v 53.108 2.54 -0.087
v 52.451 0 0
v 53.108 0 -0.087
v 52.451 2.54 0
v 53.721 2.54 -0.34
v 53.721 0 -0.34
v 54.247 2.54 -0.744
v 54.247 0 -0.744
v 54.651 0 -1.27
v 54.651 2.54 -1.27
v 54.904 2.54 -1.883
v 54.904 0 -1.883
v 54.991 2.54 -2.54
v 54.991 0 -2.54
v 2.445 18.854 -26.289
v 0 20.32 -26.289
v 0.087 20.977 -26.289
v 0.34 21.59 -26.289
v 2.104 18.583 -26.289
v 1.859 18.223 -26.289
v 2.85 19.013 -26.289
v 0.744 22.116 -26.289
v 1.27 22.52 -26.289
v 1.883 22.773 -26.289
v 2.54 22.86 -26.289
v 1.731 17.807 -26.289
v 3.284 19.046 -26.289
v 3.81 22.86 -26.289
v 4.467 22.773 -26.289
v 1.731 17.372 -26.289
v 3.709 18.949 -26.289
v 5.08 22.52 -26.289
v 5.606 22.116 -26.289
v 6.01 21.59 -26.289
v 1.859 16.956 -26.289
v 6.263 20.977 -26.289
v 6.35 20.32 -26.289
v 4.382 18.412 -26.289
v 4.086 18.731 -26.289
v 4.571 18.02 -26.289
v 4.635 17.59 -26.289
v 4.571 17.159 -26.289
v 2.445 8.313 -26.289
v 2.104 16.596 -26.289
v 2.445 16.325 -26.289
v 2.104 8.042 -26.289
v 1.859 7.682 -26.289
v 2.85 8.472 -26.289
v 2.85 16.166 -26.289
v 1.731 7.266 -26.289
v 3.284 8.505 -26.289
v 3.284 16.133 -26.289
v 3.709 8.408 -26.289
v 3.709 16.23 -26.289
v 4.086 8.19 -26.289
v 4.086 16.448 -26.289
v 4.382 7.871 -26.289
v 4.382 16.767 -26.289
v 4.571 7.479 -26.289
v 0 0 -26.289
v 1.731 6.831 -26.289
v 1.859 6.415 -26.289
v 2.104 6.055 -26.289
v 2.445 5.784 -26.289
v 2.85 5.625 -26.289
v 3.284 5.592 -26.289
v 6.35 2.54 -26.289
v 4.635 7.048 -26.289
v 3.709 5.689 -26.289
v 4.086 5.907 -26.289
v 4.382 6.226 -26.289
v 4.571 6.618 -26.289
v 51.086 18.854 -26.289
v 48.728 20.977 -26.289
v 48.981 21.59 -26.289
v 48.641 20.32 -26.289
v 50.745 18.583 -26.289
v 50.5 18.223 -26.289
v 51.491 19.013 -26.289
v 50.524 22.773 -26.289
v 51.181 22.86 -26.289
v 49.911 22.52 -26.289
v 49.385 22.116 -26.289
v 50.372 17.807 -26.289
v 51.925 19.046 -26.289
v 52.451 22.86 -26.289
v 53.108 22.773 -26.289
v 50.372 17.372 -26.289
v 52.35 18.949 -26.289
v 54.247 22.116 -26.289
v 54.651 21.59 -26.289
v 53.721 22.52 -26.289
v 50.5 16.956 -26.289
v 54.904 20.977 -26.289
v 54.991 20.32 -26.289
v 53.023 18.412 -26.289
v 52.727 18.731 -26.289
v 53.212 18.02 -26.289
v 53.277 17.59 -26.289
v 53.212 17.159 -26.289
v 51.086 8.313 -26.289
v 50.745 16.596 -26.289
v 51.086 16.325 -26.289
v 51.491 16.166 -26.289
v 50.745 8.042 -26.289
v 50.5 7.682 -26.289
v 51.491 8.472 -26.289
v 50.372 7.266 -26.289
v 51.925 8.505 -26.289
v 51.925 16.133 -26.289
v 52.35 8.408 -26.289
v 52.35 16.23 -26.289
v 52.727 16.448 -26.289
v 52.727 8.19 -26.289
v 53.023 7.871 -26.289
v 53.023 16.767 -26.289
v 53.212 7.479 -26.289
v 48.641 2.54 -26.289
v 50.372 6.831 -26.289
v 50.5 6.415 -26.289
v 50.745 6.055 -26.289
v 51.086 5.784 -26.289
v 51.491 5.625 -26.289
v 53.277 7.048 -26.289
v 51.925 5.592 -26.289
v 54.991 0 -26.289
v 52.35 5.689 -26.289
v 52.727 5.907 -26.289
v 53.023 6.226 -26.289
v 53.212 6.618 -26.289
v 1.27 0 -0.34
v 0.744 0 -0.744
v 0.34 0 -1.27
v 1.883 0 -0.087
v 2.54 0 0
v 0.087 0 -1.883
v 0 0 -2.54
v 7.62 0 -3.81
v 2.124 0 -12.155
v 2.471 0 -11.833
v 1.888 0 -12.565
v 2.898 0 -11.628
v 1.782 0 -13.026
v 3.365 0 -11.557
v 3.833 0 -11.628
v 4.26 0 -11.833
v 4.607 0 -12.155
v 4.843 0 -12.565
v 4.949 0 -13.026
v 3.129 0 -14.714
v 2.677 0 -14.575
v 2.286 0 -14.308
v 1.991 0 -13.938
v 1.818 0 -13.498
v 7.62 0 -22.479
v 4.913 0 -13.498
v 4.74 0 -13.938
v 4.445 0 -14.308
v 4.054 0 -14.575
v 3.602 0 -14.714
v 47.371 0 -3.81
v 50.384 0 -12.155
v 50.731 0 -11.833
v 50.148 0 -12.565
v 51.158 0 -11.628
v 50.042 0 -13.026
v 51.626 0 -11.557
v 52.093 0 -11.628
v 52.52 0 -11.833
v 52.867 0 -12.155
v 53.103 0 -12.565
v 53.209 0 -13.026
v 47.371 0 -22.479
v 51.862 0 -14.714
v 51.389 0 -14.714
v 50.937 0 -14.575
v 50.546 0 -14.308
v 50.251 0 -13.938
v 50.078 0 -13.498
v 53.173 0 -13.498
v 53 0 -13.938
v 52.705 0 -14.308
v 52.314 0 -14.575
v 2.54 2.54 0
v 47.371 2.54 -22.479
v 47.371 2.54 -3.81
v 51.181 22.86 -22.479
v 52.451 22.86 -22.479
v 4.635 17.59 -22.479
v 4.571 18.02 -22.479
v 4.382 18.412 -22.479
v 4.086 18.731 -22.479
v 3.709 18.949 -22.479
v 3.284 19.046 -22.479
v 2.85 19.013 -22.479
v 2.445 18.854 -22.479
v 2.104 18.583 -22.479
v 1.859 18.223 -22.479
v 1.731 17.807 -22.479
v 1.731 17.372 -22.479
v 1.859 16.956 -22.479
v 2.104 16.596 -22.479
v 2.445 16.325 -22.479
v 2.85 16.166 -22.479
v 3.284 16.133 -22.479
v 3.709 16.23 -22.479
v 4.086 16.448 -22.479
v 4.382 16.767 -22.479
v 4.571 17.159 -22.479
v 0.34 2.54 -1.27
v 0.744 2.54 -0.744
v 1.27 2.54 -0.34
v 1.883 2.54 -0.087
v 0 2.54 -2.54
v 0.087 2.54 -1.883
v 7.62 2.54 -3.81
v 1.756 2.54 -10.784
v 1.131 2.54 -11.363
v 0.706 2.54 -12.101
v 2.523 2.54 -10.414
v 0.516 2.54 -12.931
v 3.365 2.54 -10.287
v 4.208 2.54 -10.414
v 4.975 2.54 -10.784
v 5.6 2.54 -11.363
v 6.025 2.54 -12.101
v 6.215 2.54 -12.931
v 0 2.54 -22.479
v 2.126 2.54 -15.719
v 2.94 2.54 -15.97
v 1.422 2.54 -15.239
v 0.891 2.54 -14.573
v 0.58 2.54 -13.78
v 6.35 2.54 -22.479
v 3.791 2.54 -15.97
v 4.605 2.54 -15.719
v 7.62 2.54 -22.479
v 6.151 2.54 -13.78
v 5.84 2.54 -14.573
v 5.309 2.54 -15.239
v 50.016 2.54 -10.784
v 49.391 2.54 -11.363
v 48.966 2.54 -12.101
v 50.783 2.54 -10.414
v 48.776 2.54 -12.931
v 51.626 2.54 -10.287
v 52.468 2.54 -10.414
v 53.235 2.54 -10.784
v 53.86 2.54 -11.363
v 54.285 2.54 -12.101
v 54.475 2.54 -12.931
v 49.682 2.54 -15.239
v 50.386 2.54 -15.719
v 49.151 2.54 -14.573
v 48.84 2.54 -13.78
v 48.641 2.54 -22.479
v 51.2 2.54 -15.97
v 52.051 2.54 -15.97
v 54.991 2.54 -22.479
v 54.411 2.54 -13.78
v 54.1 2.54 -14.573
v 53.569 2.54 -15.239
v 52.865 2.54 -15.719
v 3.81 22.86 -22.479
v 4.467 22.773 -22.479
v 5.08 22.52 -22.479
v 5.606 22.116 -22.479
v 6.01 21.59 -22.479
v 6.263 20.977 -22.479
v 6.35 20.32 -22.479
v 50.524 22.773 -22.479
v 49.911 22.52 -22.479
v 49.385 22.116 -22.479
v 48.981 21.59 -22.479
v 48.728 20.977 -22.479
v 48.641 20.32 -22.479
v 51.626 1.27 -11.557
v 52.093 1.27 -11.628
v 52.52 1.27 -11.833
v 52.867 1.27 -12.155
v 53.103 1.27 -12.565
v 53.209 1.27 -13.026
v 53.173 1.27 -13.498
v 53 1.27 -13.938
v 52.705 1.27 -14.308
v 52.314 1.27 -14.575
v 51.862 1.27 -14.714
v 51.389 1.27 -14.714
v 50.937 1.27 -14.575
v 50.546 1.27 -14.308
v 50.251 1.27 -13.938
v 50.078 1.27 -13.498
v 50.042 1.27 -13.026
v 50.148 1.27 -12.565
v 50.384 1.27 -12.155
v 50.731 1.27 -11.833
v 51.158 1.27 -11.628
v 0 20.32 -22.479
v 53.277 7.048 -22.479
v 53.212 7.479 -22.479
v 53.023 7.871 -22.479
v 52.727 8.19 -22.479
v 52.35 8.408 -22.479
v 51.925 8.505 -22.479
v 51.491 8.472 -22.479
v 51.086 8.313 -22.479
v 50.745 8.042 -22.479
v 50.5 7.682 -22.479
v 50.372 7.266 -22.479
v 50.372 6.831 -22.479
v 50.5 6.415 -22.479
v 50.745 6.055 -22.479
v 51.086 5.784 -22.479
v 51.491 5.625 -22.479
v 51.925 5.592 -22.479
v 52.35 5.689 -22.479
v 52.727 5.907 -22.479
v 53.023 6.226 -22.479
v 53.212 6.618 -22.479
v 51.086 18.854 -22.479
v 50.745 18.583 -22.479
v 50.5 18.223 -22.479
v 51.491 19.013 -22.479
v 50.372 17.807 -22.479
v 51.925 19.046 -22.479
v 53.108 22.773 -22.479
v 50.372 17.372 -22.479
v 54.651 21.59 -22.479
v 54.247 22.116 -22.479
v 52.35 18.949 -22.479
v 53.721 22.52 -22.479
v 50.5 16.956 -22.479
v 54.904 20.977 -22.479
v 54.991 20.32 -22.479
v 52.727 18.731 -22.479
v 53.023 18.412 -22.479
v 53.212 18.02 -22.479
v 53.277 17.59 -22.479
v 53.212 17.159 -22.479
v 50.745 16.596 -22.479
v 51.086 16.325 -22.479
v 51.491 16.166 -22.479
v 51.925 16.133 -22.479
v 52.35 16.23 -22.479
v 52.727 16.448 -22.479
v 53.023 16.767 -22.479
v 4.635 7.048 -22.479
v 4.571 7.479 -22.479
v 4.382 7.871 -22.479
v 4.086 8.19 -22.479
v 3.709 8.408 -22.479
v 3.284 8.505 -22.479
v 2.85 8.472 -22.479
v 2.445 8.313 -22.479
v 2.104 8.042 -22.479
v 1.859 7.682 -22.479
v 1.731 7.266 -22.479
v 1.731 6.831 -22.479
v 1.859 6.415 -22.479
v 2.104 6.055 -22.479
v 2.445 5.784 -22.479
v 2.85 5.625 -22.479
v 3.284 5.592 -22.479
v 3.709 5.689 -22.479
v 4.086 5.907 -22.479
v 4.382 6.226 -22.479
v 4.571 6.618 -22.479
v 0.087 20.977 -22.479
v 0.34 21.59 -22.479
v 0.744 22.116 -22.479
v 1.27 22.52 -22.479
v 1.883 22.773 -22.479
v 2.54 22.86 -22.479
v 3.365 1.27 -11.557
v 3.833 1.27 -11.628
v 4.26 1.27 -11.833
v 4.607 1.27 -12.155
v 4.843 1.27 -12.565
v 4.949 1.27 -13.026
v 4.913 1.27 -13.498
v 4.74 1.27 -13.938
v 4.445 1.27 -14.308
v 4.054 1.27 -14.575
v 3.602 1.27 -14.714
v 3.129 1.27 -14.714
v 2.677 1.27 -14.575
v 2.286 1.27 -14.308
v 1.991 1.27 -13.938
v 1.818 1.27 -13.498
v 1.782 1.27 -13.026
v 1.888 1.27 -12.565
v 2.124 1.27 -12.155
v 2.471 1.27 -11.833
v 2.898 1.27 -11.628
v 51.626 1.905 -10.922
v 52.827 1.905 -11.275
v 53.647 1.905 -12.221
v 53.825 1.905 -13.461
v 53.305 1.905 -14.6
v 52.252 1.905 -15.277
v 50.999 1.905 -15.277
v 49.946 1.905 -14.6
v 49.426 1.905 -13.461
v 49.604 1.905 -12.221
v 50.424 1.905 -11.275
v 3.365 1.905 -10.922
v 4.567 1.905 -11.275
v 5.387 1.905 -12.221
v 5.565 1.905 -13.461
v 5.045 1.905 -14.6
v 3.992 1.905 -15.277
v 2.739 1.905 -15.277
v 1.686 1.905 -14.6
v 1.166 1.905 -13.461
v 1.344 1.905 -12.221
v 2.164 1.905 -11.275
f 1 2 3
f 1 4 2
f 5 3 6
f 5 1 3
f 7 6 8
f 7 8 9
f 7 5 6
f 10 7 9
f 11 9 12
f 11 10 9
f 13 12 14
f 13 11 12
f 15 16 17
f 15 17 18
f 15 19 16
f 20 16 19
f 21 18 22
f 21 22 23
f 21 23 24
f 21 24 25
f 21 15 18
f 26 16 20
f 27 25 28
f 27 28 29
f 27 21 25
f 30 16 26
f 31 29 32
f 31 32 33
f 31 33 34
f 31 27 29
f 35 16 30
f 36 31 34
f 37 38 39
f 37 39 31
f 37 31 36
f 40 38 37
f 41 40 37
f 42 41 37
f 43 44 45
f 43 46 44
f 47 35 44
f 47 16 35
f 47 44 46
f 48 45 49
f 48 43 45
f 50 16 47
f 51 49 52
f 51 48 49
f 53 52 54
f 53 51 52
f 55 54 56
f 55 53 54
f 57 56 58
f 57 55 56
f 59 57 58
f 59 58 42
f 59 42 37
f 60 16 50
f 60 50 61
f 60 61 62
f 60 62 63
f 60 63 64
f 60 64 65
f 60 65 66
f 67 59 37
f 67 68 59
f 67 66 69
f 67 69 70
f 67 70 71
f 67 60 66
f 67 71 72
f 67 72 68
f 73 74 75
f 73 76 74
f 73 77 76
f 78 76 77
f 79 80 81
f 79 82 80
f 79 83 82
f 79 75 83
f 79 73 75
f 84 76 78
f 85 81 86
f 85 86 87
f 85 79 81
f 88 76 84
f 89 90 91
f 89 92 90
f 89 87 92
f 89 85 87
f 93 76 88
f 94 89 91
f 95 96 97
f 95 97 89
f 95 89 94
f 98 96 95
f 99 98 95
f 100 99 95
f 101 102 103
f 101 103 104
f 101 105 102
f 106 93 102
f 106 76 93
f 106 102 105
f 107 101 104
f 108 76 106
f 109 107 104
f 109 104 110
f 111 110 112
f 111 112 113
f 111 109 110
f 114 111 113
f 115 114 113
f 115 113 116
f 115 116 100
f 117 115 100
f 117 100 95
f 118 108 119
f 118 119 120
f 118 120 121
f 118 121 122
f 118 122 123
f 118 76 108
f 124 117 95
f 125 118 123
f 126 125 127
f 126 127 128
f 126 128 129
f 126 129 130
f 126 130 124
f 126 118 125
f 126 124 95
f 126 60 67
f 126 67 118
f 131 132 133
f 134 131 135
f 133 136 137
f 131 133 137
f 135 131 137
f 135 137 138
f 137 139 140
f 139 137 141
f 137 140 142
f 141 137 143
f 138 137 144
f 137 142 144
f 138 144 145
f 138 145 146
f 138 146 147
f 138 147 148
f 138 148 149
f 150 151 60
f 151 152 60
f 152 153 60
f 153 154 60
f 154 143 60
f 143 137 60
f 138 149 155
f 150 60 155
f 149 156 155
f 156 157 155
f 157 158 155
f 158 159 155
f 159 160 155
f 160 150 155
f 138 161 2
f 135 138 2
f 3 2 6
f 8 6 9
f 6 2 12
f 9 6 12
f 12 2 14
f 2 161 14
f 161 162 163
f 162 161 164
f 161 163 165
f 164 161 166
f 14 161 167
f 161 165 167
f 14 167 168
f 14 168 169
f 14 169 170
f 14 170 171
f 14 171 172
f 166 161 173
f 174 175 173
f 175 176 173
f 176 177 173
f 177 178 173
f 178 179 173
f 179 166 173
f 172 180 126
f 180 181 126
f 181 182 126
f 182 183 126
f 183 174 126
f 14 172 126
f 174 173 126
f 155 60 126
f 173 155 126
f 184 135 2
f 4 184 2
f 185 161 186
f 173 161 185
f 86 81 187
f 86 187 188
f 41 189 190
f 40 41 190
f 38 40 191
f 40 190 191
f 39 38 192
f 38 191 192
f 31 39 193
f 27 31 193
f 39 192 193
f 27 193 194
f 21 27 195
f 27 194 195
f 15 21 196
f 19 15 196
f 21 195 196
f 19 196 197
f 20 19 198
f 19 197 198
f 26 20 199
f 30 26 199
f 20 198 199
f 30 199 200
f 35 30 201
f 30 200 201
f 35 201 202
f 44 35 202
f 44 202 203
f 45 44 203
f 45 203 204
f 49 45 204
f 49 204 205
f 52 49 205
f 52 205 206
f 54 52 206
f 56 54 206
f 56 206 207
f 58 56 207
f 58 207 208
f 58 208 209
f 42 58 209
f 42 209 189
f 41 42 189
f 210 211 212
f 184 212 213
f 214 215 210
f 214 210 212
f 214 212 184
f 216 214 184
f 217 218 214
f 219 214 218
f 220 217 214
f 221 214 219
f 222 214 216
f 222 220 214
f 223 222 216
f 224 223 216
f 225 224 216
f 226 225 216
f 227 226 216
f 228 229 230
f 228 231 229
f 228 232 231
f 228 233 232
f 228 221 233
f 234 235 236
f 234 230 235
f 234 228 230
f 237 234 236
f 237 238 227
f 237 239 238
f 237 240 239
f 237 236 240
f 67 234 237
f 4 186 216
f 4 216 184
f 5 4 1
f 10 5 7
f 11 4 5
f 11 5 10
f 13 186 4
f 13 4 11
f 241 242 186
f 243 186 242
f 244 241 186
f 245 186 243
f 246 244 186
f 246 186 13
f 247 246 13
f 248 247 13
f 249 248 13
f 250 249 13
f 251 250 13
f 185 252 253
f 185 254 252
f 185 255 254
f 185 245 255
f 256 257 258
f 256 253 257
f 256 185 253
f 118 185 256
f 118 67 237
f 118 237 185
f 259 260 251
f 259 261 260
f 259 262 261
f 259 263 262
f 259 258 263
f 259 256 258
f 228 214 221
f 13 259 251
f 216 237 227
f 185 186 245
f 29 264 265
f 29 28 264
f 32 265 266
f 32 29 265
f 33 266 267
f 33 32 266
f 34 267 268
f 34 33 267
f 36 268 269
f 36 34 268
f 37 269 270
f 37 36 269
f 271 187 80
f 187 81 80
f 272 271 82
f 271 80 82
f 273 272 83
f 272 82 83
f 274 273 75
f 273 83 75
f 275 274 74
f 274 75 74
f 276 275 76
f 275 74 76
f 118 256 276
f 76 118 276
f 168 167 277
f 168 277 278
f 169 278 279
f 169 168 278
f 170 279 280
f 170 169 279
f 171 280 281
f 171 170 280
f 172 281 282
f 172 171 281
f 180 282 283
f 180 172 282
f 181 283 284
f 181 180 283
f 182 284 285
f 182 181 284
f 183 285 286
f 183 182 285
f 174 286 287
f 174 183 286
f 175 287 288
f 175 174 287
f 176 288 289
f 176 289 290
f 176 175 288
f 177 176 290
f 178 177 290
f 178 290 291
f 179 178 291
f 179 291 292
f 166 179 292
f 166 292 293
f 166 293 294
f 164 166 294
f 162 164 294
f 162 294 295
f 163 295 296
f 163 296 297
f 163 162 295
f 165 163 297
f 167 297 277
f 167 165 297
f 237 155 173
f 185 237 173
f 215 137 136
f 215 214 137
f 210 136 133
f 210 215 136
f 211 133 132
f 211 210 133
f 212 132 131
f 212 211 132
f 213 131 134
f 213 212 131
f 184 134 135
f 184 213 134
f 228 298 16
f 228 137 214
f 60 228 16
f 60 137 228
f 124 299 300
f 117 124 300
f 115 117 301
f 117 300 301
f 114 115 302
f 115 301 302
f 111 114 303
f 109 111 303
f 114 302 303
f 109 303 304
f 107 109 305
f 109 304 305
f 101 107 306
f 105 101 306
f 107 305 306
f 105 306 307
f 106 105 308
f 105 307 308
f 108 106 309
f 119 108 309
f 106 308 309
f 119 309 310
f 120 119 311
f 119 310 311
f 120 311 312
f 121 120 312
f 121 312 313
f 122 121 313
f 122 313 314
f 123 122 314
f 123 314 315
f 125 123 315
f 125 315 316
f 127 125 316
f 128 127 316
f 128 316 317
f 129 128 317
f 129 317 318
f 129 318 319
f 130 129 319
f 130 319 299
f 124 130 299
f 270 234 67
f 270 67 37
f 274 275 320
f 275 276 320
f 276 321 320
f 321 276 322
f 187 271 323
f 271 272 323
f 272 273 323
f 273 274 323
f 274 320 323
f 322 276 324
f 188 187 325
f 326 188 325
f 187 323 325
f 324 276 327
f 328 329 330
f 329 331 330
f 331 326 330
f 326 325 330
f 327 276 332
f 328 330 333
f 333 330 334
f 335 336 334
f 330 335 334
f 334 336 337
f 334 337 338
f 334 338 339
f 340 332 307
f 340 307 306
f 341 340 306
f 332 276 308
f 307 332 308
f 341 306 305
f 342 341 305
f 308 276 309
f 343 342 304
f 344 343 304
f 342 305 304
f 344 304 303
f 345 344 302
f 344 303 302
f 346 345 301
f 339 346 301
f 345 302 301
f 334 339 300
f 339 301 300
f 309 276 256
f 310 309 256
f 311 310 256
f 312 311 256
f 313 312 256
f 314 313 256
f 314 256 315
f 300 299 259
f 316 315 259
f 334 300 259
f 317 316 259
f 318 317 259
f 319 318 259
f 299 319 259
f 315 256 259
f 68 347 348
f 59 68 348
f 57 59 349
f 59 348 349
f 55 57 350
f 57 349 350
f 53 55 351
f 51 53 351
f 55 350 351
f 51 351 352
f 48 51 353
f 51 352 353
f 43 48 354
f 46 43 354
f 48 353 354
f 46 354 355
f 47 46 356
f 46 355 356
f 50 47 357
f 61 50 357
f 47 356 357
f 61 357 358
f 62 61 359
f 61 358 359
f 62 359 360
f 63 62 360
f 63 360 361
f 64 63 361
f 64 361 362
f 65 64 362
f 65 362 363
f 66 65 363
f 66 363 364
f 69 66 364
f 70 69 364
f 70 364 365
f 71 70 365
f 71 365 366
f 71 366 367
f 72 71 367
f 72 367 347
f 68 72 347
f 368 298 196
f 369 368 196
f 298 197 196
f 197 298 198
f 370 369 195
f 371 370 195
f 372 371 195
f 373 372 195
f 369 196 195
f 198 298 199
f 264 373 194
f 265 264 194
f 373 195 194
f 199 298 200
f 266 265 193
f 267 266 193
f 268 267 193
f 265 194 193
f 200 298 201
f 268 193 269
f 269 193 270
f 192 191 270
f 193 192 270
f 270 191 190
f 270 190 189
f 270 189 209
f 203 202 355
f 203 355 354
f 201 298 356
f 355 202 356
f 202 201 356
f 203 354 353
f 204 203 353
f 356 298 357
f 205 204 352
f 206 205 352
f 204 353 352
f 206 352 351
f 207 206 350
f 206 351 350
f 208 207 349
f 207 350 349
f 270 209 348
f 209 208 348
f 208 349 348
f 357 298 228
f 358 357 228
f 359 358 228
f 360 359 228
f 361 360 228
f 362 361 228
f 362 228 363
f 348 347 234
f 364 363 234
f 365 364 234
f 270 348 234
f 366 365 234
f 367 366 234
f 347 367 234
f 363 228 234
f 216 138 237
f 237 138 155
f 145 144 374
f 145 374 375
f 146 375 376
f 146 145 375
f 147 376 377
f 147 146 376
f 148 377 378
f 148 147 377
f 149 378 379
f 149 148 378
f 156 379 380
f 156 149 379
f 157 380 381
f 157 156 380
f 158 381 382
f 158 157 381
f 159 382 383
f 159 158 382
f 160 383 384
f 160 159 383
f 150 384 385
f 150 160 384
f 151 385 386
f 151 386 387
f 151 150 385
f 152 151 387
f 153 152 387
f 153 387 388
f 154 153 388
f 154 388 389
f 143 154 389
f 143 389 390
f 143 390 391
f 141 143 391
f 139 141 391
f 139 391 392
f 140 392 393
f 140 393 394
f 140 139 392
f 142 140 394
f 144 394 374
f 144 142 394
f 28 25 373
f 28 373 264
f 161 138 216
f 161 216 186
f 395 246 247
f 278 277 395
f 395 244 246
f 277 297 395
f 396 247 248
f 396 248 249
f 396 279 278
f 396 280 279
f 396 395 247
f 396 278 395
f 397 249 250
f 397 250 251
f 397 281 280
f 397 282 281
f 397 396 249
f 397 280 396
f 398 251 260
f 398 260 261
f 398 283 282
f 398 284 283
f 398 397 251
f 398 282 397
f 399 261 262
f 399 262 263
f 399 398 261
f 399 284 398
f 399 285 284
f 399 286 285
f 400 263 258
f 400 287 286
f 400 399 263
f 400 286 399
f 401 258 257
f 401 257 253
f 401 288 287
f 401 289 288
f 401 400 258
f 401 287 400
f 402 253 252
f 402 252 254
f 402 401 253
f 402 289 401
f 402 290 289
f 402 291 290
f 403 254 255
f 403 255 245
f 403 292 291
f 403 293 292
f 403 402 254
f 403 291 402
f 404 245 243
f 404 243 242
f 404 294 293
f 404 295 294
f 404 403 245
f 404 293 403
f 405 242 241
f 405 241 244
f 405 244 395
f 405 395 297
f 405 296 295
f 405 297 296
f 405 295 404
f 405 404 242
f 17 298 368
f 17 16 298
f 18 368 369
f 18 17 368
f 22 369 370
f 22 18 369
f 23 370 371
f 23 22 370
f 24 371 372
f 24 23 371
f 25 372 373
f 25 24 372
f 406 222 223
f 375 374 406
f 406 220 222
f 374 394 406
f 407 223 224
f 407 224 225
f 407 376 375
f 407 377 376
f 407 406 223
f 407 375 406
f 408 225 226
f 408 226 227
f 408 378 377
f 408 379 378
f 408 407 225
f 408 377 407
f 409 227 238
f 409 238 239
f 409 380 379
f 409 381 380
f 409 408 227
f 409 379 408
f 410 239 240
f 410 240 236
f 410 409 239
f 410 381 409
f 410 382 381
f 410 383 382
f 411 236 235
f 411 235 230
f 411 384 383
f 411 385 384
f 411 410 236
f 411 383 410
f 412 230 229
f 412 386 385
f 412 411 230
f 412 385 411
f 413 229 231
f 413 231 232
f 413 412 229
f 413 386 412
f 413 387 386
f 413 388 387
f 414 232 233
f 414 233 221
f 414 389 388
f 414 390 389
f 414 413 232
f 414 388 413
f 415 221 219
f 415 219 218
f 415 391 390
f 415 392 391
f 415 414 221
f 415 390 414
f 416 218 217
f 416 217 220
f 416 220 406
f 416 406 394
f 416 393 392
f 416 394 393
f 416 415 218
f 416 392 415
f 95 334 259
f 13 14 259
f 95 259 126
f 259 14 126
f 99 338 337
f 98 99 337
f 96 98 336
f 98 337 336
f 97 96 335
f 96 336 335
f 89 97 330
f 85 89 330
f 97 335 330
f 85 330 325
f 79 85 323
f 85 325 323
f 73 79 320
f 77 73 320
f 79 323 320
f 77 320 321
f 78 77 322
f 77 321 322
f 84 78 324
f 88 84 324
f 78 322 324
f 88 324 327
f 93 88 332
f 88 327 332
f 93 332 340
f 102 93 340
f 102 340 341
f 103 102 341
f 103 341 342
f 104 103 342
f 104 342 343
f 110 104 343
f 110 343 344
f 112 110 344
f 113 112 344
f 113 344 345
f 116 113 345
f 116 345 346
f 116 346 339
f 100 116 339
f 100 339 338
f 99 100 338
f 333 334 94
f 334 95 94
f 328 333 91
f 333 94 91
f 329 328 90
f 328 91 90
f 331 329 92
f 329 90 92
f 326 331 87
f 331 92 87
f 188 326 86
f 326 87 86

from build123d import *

# Parameters (mm, degrees)
SKETCH1_W               = 54.991
SKETCH1_H               = 26.289
SKETCH1_R               = 1.5875
SKETCH1_W_2             = 39.751
SKETCH1_H_2             = 18.669
BASE_DEPTH              = 2.54
SKETCH2_W               = 54.991
SKETCH2_H               = 3.81
F_4_HOLE_DEPTH          = 20.32
SKETCH3_W               = 42.291
SKETCH3_H               = 20.32
GAP_DEPTH               = 64.65449805
FILLET1_R               = 2.54
CHAMFER1_SIZE           = 1.27
SKETCH4_R               = 1.4605
SERVO_SCREW_HOLES_DEPTH = 64.65449805


with BuildPart() as part:
    # Sketch1 → Base (new body)
    with BuildSketch(Plane(origin=(0, 0, 0), x_dir=(1, 0, 0), z_dir=(0, 1, 0))):
        with Locations((27.4955, 13.1445)):
            Rectangle(SKETCH1_W, SKETCH1_H)
        with Locations(Location((51.6255, 13.1445, 0), (0, 0, 270))):
            Circle(SKETCH1_R, mode=Mode.SUBTRACT)
        with Locations(Location((3.3655, 13.1445, 0), (0, 0, 270))):
            Circle(SKETCH1_R, mode=Mode.SUBTRACT)
        with Locations((27.4955, 13.1445)):
            Rectangle(SKETCH1_W_2, SKETCH1_H_2, mode=Mode.SUBTRACT)
    extrude(amount=BASE_DEPTH)

    # Sketch2 → 4 hole (add)
    with BuildSketch(Plane(origin=(0, 2.54, 0), x_dir=(1, 0, 0), z_dir=(0, 1, 0))):
        with Locations((27.4955, 24.384)):
            Rectangle(SKETCH2_W, SKETCH2_H)
    extrude(amount=F_4_HOLE_DEPTH)

    # Sketch3 → gap (cut, through all)
    with BuildSketch(Plane.XY.offset(-22.479)):
        with Locations((27.4955, 12.7)):
            Rectangle(SKETCH3_W, SKETCH3_H)
    extrude(amount=-GAP_DEPTH, mode=Mode.SUBTRACT)

    # Fillet1
    fillet1_edges = [part.edges().sort_by_distance(p)[0] for p in [
        (0, 22.86, -24.384),
        (54.991, 22.86, -24.384),
        (6.35, 22.86, -24.384),
        (48.641, 22.86, -24.384),
        (54.991, 1.27, 0),
        (0, 1.27, 0),
    ]]
    fillet(fillet1_edges, radius=FILLET1_R)

    # Chamfer1
    chamfer1_edges = [part.edges().sort_by_distance(p)[0] for p in [
        (51.6255, 2.54, -14.732),
        (3.3655, 2.54, -14.732),
    ]]
    chamfer(chamfer1_edges, length=CHAMFER1_SIZE)

    # Sketch4 → servo screw holes (cut, through all)
    with BuildSketch(Plane.XY.offset(-22.479)):
        with Locations((3.175, 17.5895)):
            Circle(SKETCH4_R)
        with Locations((3.175, 7.0485)):
            Circle(SKETCH4_R)
        with Locations((51.816, 17.5895)):
            Circle(SKETCH4_R)
        with Locations((51.816, 7.0485)):
            Circle(SKETCH4_R)
    extrude(amount=-SERVO_SCREW_HOLES_DEPTH, mode=Mode.SUBTRACT)


solid = part.part
